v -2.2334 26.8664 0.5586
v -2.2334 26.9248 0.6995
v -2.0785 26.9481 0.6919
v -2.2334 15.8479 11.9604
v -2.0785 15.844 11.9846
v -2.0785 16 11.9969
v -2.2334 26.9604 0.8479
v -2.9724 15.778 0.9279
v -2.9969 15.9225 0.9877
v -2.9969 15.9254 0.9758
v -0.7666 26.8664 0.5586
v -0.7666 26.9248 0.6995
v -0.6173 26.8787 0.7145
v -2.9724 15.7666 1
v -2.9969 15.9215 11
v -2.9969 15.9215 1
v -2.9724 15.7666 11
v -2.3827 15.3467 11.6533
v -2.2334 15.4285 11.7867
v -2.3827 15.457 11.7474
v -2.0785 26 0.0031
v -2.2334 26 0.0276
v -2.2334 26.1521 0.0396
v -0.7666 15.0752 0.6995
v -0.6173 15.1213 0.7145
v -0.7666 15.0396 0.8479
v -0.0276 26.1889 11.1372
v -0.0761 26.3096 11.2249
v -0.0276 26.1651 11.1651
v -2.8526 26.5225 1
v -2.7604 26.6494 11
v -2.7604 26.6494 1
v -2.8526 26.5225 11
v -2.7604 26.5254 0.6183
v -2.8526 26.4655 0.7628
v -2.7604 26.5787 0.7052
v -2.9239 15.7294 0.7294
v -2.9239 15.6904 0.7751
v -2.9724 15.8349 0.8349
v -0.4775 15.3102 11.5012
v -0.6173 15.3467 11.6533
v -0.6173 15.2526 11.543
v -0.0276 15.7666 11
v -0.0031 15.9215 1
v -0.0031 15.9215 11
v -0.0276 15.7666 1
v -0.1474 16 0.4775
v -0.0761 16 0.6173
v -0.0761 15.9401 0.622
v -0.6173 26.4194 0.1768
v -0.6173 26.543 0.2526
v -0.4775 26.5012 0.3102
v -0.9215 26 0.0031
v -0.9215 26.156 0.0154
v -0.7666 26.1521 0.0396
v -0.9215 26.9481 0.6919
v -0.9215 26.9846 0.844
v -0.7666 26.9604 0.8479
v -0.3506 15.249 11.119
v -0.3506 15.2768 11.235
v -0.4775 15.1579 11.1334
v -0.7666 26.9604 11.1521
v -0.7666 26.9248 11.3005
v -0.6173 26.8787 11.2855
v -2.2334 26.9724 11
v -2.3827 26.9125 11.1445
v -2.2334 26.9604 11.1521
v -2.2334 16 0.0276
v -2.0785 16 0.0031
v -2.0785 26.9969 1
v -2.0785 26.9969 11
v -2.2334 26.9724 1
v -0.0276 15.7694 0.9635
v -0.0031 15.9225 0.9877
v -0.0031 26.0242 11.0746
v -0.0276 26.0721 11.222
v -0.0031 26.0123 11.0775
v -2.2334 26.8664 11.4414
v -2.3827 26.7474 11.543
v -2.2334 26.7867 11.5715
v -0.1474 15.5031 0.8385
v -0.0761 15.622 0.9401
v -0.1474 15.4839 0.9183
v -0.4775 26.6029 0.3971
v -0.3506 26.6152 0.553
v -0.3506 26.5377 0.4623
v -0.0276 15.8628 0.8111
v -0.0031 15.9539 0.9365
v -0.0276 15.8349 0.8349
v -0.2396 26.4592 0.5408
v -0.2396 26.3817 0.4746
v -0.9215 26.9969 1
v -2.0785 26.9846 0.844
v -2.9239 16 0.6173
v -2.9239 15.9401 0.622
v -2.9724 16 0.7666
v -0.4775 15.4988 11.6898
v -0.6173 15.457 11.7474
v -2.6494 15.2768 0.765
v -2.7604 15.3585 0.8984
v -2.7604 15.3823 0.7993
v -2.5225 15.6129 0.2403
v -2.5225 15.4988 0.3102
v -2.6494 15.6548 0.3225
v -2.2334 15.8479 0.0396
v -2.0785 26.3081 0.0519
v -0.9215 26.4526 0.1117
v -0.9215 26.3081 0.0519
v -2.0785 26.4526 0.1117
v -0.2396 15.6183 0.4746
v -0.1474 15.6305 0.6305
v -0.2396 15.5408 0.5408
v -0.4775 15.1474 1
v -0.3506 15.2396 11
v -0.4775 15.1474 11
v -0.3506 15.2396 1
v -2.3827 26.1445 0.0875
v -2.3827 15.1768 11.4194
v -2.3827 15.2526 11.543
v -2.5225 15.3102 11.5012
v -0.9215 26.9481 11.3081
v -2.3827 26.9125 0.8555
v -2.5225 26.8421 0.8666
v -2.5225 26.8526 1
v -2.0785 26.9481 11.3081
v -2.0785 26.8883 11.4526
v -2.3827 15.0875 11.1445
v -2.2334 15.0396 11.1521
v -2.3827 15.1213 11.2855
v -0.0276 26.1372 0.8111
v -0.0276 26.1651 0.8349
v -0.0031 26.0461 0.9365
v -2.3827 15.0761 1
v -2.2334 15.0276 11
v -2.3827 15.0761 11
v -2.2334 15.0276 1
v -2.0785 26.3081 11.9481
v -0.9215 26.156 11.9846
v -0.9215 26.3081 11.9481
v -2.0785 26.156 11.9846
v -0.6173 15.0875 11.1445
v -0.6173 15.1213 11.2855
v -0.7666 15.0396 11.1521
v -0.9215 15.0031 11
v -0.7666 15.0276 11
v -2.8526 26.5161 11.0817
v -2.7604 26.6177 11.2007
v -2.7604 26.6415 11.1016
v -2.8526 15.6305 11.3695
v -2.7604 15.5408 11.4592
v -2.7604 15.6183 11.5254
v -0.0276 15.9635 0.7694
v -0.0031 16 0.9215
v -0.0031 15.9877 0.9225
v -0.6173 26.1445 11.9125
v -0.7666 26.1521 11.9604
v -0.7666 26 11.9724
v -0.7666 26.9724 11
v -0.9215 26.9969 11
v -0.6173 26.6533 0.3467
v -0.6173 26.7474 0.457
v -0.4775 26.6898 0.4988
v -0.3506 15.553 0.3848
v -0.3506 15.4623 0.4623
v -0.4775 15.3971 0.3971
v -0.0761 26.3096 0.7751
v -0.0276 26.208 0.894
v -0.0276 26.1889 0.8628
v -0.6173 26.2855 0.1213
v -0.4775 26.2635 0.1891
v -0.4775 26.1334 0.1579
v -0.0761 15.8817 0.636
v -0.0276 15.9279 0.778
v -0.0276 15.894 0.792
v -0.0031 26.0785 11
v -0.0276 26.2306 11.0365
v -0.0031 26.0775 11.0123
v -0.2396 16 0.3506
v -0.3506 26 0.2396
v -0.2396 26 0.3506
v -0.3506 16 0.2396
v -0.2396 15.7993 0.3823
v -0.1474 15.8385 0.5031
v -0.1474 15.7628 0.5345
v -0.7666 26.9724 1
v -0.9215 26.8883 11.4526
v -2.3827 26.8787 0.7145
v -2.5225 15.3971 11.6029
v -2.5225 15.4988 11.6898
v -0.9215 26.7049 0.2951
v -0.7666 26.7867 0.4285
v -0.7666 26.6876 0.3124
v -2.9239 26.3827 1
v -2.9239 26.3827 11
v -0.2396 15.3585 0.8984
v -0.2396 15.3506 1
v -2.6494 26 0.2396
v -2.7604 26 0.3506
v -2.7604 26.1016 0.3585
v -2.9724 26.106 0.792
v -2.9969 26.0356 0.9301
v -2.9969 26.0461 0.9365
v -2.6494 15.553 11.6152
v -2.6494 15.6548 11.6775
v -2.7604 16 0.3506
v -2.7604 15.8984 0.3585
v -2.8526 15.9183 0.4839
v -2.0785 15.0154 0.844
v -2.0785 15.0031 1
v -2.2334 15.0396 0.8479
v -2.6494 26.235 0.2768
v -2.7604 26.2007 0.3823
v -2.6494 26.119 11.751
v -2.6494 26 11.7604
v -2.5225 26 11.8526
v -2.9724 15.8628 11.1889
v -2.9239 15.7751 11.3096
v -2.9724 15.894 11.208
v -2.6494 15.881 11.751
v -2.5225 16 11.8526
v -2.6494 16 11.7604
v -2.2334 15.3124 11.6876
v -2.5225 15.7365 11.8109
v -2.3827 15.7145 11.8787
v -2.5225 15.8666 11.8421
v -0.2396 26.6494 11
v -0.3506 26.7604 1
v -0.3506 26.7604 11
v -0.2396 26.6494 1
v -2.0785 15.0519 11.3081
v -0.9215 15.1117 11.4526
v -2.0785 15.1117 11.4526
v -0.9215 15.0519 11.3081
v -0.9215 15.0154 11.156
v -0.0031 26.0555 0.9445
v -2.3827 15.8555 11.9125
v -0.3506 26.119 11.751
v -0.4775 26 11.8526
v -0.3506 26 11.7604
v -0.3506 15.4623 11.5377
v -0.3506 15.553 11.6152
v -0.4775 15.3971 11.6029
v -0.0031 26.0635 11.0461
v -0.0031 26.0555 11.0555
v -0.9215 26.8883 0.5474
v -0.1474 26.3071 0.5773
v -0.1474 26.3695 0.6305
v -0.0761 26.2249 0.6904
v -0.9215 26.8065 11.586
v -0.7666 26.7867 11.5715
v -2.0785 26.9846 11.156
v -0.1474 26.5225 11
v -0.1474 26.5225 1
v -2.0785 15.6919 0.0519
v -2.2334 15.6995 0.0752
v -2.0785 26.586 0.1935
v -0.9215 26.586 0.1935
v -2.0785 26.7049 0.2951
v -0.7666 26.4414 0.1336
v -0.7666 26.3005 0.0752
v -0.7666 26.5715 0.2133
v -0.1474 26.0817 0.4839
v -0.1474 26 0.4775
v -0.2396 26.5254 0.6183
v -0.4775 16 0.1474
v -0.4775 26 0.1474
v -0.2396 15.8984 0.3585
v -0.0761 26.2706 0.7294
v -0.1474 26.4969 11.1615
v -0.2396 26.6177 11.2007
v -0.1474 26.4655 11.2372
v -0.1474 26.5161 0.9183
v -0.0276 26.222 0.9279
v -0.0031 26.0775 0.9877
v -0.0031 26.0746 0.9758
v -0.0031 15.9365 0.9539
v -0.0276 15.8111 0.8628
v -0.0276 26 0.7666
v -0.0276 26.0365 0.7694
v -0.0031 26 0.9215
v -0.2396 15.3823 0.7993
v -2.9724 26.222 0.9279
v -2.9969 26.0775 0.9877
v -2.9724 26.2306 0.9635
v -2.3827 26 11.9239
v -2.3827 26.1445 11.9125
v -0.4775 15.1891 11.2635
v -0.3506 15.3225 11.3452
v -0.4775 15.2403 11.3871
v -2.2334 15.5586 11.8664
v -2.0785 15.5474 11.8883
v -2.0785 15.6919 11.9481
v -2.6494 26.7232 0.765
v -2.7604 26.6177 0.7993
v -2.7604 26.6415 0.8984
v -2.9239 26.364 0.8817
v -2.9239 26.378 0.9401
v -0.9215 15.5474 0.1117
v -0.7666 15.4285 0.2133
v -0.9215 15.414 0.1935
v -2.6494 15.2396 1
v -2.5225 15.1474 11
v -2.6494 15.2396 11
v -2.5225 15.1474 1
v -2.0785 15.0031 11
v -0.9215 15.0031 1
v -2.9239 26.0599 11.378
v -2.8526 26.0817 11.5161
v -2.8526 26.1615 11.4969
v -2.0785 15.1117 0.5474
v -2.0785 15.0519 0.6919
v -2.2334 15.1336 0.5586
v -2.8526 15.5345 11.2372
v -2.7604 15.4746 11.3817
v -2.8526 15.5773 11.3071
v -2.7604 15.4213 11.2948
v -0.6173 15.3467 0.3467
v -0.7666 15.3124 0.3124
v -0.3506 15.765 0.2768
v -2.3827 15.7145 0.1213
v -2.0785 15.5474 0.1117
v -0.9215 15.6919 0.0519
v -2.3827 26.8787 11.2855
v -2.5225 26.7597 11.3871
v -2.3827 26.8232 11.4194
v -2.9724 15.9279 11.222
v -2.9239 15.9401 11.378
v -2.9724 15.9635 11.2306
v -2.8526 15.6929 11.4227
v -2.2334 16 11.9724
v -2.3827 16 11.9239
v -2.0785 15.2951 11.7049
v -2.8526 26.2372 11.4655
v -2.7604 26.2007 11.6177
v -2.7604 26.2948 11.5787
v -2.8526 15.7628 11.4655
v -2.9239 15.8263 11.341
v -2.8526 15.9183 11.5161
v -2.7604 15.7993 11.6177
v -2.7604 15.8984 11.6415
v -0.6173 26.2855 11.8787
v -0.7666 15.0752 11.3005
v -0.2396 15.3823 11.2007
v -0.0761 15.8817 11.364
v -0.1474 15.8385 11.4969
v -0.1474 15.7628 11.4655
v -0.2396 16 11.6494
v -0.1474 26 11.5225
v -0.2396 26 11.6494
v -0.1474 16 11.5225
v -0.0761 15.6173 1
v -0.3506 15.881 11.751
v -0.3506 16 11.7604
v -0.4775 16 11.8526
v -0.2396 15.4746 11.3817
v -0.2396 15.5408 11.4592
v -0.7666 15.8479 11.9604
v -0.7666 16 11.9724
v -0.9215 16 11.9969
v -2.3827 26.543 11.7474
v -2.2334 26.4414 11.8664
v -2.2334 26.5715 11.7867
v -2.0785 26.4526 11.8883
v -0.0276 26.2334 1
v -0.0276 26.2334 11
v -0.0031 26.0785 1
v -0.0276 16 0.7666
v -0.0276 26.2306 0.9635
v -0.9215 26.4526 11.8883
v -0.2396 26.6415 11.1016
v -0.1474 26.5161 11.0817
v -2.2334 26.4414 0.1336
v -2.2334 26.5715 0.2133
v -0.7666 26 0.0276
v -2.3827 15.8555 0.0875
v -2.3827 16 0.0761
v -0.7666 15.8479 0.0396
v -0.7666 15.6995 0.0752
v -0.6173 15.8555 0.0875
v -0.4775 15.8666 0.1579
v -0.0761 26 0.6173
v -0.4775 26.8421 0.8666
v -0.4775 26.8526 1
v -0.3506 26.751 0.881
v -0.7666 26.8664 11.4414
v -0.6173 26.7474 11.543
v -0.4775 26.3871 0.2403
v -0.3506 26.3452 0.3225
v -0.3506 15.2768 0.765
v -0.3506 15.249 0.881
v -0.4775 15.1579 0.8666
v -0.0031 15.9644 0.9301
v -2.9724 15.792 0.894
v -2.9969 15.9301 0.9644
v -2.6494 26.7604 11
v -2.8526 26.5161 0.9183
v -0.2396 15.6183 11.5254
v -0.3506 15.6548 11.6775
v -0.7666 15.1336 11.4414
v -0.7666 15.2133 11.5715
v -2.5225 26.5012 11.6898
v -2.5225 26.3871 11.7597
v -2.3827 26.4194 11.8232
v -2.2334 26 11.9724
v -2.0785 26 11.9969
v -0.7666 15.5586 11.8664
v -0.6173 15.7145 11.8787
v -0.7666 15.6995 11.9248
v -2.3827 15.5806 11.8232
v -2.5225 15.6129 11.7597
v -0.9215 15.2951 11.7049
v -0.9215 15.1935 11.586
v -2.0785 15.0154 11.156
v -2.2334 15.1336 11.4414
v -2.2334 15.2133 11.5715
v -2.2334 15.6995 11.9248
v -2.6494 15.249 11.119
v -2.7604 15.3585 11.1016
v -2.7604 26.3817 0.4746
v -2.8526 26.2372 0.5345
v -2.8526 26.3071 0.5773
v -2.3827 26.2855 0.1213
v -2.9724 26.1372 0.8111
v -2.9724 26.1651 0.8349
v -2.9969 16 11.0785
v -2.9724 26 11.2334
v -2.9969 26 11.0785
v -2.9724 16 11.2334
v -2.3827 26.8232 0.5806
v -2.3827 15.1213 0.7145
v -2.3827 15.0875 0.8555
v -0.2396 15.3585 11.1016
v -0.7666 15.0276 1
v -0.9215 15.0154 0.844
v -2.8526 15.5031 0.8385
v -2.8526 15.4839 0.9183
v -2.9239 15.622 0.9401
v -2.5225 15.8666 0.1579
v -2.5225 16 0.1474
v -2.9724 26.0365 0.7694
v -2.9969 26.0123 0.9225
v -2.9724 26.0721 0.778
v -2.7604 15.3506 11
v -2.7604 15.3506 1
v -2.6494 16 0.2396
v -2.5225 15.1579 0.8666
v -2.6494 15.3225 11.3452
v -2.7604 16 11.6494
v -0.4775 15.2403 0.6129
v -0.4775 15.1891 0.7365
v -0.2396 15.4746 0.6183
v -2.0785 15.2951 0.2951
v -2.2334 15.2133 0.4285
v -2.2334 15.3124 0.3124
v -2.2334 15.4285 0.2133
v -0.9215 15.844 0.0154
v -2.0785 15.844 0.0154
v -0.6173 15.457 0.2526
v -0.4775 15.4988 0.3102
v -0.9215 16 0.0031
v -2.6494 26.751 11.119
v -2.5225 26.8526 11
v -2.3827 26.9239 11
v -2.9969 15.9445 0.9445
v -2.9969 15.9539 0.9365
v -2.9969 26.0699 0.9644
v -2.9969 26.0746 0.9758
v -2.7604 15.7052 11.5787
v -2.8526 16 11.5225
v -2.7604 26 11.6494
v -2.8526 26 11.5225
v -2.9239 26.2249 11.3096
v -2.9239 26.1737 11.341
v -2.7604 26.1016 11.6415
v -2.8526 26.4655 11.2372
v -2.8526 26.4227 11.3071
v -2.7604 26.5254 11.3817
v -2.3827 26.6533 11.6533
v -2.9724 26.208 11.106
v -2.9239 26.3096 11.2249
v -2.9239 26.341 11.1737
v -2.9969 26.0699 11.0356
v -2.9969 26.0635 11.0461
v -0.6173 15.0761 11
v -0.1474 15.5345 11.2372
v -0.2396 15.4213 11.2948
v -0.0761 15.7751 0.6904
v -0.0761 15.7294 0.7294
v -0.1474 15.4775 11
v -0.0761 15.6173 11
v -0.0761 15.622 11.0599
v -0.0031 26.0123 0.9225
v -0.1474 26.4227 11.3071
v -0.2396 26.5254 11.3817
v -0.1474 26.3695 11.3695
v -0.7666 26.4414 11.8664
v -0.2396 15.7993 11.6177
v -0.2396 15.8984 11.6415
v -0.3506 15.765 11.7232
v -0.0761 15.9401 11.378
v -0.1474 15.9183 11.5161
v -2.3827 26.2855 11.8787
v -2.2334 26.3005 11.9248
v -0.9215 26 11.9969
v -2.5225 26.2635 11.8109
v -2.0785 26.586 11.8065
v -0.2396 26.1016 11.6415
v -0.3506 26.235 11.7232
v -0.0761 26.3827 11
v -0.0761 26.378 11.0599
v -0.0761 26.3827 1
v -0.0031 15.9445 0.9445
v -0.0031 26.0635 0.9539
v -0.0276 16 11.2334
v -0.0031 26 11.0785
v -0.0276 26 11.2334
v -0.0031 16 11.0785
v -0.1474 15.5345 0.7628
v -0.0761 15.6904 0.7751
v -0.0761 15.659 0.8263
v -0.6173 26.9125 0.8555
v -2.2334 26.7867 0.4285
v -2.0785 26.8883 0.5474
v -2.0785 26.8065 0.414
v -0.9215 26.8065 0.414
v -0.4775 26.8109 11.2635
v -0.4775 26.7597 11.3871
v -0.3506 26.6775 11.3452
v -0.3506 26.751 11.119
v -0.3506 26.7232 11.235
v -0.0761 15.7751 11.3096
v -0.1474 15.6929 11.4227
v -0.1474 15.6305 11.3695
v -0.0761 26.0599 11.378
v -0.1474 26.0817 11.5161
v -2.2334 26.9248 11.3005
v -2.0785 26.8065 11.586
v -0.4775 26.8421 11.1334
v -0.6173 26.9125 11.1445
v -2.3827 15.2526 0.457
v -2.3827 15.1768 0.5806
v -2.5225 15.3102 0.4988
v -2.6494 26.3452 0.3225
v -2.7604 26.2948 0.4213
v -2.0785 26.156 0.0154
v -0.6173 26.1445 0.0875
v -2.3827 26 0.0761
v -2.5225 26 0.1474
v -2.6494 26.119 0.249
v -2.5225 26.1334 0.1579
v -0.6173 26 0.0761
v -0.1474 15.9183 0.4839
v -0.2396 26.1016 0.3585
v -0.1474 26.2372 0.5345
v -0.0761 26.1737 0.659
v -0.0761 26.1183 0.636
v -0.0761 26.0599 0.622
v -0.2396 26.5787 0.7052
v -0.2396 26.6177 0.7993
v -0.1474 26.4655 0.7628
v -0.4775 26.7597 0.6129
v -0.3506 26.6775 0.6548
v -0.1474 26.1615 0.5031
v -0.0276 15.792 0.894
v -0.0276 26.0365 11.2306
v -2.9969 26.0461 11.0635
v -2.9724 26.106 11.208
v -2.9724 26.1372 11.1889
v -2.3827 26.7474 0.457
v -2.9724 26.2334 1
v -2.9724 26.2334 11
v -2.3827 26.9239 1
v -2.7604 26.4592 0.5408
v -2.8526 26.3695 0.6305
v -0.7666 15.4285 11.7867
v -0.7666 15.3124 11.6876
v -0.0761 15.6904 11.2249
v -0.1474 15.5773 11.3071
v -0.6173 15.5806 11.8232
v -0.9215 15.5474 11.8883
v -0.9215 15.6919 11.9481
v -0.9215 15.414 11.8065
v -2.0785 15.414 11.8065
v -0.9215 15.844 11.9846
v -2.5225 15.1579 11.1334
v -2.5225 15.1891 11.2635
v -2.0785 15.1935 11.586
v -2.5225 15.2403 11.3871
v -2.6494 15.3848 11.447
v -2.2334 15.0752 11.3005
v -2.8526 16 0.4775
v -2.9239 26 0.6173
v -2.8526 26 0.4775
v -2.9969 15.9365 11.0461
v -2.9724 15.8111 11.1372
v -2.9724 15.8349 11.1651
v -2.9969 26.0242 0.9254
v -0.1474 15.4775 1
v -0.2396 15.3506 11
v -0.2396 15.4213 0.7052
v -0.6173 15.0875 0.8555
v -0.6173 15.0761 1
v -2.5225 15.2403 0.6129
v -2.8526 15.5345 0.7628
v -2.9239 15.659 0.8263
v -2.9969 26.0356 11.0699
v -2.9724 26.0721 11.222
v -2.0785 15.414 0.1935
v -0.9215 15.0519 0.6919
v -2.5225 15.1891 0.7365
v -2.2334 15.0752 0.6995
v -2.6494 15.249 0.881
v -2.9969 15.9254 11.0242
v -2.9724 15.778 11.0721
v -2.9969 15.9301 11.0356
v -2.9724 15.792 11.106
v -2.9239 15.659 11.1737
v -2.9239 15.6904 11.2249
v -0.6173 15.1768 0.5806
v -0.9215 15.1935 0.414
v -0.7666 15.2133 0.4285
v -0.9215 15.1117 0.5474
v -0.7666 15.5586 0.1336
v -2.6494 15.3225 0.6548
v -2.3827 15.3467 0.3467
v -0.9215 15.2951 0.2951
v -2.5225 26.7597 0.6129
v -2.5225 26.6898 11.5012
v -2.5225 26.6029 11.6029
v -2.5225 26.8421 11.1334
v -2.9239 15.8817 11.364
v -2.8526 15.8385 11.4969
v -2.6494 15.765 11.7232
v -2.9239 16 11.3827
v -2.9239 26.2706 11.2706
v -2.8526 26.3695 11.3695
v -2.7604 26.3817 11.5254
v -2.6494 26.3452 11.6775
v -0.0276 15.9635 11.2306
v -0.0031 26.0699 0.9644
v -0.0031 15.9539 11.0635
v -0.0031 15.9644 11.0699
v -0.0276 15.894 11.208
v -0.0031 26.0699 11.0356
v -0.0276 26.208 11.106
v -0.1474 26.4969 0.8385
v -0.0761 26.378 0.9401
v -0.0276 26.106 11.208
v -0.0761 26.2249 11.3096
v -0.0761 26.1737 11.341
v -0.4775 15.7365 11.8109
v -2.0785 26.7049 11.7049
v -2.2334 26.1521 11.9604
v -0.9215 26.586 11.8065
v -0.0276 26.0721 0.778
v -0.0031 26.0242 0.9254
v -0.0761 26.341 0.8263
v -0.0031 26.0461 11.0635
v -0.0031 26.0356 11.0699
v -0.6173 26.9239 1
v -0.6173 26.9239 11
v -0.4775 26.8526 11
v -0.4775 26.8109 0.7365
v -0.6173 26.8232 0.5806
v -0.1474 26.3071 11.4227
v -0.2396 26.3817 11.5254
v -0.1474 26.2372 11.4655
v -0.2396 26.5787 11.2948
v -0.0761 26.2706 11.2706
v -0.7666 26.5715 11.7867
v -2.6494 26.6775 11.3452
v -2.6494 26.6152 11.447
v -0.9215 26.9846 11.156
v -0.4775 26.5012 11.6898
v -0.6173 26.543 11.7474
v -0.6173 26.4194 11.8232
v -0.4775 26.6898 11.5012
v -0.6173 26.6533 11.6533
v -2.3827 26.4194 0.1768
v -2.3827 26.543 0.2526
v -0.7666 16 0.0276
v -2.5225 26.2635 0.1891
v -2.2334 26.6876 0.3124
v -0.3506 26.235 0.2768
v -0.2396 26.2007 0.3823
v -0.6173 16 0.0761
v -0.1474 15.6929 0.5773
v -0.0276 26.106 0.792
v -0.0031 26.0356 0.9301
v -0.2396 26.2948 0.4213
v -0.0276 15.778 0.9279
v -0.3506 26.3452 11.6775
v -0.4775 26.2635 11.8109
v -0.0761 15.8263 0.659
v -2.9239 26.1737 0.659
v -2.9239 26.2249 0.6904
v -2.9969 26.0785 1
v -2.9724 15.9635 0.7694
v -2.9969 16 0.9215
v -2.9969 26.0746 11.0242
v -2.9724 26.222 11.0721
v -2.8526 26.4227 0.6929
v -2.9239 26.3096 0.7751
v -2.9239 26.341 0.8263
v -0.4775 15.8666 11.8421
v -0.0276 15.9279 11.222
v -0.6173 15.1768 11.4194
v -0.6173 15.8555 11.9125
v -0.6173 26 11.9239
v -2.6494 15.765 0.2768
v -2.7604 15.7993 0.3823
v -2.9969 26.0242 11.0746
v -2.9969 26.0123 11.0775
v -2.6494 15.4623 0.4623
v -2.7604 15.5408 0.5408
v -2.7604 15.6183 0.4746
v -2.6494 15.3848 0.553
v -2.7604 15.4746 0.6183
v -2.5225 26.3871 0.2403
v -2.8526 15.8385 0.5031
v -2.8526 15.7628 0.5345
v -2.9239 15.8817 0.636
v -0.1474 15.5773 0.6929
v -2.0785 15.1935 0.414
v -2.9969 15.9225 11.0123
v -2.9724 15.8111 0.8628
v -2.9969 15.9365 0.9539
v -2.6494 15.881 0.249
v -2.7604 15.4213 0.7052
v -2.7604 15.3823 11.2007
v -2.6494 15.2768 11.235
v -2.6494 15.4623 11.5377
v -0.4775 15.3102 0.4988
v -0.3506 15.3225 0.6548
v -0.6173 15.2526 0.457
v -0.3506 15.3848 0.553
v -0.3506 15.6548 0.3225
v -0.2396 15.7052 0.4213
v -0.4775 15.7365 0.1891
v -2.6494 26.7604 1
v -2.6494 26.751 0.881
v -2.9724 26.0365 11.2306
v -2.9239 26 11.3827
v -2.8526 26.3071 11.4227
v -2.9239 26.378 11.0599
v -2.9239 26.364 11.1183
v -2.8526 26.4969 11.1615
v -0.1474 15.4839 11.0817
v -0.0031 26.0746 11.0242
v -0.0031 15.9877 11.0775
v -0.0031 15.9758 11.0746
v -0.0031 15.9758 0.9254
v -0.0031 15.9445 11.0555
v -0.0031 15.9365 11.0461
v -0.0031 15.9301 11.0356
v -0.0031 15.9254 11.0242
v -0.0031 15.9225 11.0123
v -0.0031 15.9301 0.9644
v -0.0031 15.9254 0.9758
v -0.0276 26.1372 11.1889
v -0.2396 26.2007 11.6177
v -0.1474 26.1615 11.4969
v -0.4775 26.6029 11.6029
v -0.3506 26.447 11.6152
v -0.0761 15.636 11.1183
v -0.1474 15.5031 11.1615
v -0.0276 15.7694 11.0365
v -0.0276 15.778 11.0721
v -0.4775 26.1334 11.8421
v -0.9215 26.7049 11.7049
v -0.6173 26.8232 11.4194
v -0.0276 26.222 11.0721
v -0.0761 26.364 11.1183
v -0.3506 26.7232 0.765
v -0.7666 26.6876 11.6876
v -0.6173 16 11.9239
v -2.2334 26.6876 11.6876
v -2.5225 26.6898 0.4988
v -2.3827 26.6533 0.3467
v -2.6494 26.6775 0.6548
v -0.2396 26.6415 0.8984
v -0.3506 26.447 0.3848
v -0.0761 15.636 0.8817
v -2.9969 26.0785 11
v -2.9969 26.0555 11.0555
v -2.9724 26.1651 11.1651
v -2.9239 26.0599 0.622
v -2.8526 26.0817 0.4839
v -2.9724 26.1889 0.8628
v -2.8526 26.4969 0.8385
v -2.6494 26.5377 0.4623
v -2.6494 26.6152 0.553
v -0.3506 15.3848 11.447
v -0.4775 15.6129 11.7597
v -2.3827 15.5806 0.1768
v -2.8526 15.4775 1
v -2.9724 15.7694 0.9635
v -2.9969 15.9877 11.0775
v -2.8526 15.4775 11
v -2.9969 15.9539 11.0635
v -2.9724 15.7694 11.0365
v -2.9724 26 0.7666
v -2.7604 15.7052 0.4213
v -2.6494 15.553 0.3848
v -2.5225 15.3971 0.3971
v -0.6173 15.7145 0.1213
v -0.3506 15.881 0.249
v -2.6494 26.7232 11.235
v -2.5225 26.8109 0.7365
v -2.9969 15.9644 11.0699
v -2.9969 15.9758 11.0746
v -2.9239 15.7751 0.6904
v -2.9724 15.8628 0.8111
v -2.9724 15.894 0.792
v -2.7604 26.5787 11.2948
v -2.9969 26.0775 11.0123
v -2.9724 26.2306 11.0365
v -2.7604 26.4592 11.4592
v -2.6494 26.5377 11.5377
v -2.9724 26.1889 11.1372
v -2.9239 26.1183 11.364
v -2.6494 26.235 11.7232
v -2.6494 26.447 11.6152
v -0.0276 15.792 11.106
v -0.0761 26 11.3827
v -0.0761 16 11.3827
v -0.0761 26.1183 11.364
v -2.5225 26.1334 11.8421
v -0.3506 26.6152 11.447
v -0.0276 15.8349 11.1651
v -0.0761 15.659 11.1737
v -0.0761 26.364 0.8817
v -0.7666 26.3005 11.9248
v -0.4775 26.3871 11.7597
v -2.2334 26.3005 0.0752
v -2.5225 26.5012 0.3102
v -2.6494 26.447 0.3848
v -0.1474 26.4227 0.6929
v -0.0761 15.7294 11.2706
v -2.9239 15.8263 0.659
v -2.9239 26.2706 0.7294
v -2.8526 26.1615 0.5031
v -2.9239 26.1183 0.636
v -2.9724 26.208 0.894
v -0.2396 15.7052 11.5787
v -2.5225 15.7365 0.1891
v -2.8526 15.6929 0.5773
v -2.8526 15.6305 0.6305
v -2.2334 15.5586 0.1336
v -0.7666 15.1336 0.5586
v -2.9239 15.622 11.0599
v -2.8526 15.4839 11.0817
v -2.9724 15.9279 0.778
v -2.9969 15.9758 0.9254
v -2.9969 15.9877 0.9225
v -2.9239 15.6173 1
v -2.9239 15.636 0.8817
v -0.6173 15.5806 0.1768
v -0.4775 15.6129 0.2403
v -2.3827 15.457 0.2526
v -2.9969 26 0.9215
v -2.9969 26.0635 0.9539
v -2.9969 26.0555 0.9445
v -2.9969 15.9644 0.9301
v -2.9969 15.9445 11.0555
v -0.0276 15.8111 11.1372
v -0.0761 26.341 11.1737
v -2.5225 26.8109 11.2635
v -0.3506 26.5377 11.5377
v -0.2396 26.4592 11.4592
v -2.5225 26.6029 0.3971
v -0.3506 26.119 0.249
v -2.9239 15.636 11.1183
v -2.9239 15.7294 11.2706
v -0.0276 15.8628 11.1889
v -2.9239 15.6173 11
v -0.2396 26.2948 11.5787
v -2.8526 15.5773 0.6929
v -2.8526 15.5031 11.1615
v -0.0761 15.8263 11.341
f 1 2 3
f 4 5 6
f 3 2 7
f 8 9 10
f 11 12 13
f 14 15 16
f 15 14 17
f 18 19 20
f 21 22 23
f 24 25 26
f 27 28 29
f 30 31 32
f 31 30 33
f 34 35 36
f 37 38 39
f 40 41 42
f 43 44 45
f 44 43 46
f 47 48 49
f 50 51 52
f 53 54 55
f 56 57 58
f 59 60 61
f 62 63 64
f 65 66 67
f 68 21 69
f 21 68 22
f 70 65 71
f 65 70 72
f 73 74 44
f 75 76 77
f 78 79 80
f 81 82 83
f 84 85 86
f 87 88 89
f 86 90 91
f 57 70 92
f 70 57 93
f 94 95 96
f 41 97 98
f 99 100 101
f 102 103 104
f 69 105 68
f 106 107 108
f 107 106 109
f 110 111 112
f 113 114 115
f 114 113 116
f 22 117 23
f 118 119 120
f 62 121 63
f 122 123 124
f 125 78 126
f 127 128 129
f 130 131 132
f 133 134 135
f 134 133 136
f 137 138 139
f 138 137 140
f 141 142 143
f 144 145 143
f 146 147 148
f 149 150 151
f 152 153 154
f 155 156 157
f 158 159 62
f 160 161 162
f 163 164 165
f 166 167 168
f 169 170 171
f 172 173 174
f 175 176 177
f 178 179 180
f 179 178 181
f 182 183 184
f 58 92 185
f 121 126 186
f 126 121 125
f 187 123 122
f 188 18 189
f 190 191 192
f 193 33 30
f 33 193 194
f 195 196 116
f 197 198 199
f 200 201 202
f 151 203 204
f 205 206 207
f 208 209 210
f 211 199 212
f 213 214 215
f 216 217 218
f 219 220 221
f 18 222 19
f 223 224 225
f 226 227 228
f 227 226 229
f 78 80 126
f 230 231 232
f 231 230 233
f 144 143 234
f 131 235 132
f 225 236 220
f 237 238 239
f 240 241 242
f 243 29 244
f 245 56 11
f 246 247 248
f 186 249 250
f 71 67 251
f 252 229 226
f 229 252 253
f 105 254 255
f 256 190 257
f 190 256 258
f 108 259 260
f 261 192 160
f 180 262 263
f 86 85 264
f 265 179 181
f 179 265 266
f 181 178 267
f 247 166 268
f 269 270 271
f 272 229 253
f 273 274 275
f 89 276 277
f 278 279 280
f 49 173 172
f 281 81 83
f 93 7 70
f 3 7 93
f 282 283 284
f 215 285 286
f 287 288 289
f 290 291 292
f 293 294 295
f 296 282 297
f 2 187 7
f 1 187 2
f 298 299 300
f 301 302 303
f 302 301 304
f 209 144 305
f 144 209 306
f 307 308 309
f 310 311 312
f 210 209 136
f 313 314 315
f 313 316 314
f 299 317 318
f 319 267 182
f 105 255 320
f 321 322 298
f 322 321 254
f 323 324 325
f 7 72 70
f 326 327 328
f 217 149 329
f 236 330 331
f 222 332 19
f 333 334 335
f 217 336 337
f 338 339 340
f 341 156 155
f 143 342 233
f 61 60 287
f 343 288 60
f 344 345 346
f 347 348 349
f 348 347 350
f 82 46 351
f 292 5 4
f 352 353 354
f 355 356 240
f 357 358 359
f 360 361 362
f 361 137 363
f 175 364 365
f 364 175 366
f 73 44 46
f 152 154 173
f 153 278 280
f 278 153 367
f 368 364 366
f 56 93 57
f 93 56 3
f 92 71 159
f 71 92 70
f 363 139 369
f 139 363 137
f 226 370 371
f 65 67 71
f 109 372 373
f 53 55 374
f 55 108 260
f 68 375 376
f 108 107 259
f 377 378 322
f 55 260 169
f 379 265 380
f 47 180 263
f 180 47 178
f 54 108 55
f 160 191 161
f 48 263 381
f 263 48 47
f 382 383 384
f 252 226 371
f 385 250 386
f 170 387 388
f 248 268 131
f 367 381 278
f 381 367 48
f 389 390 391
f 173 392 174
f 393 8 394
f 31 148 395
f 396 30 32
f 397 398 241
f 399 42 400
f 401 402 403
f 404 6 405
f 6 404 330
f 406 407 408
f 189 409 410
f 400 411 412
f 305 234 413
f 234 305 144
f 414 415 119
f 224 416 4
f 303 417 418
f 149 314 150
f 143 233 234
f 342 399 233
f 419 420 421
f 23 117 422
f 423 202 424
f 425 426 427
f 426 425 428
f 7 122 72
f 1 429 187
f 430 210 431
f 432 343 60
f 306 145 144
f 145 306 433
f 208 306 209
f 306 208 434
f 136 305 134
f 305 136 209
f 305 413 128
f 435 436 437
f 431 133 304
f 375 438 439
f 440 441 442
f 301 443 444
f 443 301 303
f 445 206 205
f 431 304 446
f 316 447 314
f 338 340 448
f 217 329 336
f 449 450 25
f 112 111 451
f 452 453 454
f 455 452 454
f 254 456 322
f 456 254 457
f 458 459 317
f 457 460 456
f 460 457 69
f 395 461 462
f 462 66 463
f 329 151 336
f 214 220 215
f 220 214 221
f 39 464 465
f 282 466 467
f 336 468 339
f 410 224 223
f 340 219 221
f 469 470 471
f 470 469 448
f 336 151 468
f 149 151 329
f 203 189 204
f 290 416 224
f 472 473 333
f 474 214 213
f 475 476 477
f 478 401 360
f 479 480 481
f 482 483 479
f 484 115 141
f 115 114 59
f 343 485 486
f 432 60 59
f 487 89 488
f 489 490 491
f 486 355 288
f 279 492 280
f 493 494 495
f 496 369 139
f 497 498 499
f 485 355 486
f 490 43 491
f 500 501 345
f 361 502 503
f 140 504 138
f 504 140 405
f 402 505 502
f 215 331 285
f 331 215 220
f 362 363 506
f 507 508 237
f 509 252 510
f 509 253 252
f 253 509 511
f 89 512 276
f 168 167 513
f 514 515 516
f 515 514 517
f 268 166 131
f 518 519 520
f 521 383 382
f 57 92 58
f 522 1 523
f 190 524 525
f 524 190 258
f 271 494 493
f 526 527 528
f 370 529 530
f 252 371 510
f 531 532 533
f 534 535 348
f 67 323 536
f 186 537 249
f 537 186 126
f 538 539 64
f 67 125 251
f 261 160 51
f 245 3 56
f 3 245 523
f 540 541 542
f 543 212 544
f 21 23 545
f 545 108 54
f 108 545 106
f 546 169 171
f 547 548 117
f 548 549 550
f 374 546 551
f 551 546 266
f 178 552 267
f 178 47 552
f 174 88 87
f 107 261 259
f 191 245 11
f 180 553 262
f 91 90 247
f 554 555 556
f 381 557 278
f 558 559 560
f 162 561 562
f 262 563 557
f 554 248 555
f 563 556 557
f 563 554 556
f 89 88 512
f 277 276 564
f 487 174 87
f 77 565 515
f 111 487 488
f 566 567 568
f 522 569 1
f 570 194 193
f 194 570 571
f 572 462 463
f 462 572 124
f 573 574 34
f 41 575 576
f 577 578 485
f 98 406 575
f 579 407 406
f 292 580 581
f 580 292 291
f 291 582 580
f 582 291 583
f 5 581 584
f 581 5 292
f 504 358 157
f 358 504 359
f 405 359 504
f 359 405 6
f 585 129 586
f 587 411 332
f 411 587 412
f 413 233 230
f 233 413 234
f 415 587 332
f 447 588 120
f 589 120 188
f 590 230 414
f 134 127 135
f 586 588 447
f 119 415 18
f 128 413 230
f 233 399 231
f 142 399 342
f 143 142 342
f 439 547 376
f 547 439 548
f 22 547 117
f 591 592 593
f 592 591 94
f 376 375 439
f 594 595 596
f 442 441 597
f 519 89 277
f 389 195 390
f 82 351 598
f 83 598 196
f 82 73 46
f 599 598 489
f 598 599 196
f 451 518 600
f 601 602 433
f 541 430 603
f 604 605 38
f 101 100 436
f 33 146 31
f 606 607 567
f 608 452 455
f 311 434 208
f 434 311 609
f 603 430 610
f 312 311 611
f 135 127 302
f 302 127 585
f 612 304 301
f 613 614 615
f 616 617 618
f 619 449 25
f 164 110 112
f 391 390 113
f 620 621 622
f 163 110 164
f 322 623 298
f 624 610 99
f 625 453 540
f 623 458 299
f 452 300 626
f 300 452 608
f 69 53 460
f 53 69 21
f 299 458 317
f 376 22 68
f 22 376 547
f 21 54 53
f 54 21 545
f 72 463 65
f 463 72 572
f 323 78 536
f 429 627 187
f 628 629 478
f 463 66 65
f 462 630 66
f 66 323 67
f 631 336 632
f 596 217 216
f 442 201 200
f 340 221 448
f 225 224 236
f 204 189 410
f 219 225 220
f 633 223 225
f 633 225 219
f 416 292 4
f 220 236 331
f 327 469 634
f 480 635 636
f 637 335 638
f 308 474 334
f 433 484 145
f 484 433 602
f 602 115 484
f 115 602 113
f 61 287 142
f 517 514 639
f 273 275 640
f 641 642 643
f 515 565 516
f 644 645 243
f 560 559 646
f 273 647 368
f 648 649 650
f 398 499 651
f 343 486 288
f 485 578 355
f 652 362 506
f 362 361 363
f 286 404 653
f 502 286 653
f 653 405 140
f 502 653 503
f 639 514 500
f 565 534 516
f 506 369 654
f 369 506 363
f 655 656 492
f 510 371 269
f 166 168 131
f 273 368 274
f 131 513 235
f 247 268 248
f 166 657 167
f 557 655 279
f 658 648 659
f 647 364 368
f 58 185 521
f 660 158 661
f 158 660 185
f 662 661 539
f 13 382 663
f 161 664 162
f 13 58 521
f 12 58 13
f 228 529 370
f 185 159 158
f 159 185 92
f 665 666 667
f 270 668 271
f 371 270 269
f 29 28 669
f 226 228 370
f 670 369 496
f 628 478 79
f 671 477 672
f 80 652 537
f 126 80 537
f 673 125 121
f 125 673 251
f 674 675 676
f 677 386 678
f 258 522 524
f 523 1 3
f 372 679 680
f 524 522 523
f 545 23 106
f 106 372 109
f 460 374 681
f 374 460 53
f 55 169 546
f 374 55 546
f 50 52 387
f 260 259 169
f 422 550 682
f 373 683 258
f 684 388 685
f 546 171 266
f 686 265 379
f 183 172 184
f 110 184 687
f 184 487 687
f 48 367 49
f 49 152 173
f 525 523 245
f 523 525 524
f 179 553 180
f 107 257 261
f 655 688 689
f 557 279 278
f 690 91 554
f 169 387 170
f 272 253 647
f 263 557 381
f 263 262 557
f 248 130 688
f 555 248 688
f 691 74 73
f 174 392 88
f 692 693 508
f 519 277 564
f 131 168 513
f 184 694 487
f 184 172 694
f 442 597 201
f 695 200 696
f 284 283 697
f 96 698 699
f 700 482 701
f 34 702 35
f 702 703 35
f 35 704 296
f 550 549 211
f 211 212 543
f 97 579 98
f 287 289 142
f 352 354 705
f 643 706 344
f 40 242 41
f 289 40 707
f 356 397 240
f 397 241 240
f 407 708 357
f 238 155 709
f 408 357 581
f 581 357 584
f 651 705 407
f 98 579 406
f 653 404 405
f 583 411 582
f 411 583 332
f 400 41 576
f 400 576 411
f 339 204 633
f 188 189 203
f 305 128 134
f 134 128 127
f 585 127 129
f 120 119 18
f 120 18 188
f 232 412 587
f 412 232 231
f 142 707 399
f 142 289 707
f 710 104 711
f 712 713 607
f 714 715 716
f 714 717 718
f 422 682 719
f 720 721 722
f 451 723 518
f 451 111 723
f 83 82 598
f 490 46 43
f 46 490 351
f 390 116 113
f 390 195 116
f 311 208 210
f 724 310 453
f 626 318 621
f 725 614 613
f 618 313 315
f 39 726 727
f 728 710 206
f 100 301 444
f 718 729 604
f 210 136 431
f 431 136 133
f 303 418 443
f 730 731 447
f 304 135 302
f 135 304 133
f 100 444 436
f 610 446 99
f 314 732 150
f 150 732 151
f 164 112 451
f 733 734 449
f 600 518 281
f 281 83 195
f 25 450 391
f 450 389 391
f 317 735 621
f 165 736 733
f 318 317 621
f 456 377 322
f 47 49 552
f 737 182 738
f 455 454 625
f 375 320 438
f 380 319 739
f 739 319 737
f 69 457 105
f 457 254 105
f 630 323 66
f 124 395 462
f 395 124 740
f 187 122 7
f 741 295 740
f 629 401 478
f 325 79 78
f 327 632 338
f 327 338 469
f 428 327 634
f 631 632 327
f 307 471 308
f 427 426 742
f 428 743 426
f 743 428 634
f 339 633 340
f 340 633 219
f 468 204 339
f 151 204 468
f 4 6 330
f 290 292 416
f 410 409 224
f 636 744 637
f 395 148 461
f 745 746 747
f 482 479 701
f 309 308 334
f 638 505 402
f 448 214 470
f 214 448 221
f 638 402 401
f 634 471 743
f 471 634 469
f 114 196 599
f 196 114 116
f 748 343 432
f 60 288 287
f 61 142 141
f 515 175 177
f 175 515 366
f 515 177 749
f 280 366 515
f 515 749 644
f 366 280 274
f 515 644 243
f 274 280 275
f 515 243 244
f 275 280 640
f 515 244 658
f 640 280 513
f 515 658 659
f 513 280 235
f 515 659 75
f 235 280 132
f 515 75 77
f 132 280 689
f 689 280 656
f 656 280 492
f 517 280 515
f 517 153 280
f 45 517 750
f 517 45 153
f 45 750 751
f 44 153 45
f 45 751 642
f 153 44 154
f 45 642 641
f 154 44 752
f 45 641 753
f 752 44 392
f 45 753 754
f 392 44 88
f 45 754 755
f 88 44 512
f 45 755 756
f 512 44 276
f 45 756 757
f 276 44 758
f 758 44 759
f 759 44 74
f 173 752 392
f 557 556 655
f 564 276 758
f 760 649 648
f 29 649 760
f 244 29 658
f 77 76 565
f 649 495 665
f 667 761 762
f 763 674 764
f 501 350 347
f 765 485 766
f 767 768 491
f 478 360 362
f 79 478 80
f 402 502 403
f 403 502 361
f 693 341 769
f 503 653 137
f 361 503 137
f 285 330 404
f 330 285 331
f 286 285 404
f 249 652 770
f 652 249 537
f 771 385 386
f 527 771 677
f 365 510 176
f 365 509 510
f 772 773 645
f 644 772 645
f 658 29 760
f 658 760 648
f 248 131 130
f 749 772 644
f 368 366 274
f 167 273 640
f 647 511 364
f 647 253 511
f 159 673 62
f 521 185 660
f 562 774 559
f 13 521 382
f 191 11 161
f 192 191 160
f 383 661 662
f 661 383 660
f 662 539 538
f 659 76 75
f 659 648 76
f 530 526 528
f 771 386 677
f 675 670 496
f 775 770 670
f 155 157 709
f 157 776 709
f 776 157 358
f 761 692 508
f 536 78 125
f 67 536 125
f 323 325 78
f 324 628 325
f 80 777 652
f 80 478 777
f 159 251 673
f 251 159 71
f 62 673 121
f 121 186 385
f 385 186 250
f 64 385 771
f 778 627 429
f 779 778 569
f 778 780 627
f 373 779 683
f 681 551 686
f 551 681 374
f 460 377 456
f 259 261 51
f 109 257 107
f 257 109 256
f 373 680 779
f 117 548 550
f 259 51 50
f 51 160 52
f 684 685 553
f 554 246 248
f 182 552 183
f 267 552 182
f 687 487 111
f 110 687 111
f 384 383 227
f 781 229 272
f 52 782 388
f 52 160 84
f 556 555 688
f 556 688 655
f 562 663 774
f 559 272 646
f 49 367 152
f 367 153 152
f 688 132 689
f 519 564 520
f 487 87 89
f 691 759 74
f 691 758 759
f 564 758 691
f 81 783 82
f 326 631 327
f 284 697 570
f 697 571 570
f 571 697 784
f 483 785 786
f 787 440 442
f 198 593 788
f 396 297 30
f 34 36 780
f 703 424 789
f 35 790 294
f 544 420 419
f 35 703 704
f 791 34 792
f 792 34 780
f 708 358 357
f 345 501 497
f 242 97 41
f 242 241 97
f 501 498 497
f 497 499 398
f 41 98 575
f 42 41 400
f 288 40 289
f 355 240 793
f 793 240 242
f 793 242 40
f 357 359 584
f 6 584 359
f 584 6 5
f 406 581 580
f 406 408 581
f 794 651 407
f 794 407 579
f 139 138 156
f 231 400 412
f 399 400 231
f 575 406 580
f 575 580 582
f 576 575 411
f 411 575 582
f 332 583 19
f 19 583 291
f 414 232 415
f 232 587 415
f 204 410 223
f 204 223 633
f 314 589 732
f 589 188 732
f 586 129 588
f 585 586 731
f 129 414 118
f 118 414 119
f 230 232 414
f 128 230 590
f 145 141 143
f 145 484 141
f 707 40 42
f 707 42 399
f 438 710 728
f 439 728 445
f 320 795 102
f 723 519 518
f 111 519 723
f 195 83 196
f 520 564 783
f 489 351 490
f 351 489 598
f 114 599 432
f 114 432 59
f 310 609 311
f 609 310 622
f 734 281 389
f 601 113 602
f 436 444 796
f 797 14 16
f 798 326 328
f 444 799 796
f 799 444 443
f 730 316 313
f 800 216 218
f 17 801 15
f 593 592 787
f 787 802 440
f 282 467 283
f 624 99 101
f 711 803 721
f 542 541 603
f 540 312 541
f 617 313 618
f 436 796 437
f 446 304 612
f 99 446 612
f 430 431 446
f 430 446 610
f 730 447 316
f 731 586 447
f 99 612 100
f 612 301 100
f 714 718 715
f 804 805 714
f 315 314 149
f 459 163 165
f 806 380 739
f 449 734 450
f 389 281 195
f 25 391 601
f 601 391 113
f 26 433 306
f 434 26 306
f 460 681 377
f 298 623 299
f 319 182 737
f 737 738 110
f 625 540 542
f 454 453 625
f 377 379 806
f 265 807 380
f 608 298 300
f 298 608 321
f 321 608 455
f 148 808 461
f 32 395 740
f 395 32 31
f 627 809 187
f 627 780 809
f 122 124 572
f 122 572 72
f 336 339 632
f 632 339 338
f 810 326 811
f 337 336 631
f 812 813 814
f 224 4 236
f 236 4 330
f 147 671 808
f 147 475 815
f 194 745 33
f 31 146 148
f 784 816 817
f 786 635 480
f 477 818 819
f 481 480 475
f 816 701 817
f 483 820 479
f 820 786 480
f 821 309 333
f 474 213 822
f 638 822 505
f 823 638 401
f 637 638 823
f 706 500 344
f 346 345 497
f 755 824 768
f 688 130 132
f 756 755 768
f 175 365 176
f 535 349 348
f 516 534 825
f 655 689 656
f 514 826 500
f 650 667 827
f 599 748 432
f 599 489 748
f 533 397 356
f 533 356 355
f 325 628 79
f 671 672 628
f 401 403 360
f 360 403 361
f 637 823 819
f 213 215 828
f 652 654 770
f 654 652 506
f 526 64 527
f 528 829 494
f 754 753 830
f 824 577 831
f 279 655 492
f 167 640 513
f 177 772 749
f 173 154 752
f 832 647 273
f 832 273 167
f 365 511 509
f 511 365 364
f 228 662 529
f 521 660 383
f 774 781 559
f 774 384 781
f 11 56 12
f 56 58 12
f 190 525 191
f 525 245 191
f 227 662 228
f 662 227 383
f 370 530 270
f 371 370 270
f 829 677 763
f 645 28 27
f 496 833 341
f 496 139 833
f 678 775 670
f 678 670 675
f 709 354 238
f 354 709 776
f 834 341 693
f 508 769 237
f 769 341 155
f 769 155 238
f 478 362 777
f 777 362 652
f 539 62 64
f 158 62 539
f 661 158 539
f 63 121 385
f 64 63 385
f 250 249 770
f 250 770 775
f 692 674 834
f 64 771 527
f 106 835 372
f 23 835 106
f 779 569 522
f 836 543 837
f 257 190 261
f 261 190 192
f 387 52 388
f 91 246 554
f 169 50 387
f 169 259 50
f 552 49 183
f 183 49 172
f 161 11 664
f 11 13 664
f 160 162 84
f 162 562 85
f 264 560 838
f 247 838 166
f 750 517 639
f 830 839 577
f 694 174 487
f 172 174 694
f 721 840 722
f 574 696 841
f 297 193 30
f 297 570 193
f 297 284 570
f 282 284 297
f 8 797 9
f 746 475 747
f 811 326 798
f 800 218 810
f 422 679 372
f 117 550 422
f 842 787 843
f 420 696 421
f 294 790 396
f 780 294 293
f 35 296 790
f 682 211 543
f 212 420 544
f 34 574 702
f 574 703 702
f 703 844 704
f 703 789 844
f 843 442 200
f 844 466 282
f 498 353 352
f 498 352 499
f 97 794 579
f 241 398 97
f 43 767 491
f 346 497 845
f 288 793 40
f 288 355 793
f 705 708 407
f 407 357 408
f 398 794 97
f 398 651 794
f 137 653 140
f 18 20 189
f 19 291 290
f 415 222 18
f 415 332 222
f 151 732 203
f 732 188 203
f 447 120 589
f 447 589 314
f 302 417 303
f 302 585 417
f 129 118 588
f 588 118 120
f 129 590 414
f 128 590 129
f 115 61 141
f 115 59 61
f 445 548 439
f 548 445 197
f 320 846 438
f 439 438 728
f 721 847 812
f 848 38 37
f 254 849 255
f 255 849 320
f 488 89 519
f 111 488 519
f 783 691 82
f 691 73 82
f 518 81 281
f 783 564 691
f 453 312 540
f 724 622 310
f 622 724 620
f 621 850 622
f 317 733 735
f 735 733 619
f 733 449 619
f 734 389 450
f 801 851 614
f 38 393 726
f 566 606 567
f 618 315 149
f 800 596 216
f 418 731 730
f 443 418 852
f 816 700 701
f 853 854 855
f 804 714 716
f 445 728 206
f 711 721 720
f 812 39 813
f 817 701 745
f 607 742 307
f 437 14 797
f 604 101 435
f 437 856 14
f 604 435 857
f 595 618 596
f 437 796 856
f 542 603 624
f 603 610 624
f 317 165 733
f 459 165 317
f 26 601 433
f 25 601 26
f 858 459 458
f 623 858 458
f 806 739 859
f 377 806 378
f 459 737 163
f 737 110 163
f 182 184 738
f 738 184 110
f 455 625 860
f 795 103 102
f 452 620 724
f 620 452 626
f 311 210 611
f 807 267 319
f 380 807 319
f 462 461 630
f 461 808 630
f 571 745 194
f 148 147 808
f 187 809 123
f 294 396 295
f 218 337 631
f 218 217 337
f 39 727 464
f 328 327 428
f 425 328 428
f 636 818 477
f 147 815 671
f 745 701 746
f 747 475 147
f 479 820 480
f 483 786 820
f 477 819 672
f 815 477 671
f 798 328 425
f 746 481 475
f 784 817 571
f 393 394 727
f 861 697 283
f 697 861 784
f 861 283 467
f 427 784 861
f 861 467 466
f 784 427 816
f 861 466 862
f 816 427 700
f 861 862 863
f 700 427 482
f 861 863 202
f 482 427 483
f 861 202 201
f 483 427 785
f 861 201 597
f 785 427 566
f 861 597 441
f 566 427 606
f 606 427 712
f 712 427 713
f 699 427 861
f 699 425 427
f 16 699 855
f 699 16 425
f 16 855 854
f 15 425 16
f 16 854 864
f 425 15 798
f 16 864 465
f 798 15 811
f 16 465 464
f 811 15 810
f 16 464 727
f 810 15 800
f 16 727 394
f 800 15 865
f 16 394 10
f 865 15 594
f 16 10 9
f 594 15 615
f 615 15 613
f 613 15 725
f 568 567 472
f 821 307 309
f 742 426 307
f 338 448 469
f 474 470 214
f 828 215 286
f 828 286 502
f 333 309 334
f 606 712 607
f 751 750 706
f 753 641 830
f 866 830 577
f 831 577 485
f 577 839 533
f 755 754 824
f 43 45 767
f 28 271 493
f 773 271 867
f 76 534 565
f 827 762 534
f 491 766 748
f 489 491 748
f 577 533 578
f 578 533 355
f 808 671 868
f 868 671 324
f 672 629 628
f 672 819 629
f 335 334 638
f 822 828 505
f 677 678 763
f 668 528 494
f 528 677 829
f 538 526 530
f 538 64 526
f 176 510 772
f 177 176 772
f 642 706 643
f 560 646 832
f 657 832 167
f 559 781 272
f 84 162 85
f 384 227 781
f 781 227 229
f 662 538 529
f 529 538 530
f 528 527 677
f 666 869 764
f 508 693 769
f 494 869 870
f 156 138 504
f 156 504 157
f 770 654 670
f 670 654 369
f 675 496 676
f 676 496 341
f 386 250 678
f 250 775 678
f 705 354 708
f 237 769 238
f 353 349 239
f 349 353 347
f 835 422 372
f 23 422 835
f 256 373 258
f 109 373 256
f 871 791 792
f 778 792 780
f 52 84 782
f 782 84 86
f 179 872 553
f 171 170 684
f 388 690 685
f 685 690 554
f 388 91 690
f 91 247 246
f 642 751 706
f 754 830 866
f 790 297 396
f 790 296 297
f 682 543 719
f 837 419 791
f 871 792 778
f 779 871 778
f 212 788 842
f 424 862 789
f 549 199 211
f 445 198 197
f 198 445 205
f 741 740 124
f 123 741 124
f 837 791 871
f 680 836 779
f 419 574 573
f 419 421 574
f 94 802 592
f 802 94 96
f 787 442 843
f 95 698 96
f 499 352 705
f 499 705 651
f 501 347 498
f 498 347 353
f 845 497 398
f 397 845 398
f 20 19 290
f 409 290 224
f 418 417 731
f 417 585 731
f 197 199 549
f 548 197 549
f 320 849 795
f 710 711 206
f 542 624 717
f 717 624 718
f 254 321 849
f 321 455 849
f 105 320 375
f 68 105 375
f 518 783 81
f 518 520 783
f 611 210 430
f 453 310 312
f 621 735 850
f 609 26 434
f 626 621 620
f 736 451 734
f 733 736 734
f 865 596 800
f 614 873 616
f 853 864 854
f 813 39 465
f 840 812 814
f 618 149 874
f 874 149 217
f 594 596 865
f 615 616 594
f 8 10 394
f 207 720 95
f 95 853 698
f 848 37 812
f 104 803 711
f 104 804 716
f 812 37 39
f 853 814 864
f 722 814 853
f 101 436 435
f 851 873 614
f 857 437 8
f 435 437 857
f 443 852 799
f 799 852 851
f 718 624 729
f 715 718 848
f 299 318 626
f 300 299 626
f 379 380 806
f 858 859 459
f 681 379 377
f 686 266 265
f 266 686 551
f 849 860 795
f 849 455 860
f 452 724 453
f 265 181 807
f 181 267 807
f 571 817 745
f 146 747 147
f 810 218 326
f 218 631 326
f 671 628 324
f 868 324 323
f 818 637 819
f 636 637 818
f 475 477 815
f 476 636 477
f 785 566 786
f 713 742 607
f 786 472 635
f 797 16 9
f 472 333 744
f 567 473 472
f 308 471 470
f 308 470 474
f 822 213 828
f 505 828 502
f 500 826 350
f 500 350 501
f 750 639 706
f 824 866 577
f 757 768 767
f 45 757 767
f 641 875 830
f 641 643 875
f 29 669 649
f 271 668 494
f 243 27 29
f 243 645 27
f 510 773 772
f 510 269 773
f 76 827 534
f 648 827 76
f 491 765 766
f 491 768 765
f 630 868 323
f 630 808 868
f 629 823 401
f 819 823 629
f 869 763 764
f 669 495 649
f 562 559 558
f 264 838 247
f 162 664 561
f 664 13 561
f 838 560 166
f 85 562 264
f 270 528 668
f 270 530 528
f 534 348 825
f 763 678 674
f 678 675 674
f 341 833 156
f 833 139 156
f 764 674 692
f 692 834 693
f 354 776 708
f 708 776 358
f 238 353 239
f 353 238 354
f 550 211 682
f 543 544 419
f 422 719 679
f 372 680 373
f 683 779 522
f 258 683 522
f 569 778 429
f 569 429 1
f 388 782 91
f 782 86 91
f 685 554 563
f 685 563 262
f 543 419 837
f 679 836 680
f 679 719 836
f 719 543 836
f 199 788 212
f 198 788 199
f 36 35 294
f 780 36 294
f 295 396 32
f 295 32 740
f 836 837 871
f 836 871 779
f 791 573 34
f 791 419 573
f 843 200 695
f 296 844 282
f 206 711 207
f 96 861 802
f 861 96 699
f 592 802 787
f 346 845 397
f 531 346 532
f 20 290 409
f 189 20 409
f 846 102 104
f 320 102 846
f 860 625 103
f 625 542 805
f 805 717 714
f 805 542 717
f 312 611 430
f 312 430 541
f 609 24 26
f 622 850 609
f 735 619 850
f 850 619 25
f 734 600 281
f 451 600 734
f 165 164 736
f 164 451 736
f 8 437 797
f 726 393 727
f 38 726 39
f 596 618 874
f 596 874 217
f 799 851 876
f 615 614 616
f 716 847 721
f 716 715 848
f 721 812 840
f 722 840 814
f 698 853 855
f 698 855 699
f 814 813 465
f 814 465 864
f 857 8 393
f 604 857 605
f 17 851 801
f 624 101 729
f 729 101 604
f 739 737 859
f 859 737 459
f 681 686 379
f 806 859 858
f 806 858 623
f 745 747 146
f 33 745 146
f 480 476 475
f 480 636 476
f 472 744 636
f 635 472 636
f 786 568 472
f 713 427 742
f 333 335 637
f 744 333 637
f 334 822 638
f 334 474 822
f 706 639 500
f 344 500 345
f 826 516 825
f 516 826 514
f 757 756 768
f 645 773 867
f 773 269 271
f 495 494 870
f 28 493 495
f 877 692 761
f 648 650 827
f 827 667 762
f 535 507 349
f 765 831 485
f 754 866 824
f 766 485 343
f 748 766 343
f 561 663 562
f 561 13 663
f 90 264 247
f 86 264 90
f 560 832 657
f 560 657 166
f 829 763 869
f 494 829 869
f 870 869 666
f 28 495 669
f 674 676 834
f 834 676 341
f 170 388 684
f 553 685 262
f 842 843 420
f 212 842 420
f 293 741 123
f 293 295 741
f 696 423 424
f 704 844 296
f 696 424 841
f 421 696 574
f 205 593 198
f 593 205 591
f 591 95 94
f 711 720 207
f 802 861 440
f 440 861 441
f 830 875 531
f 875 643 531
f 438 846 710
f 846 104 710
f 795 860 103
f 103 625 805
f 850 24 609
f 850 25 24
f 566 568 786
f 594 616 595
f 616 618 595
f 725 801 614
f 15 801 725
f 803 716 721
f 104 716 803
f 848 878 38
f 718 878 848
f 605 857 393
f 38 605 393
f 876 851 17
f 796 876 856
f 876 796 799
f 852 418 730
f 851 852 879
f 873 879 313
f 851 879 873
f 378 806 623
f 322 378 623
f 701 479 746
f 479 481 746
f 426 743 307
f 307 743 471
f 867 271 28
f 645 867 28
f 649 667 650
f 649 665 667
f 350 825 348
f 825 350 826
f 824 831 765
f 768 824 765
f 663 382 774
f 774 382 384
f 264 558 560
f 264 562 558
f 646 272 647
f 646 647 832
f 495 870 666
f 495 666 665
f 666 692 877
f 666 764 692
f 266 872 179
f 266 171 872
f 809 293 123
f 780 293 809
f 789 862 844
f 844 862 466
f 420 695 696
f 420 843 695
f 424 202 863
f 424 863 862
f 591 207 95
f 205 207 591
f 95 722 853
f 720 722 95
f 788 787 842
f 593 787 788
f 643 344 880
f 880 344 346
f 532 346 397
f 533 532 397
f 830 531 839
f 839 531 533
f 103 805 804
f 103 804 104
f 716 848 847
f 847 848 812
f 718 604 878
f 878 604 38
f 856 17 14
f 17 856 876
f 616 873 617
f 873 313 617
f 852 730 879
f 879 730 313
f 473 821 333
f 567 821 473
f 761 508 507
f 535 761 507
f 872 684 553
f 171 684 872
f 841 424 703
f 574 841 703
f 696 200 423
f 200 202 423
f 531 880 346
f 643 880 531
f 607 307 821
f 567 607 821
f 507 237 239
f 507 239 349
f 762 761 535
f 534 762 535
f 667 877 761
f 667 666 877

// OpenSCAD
$fn = 40;

//for (i=[0:9]){
//    translate ([i*15,0,0]) GoldTile();
//    translate ([i*15,15,0]) GoldTile();
//}


// Food light green
//translate ([0,15,0]) rotate([0,-90,0]) SheepTile();
//translate ([0,30,0]) rotate([0,-90,0]) WheatTile();
//translate ([0,45,0]) rotate([0,-90,0]) OliveTile();

// Yellow green
translate ([0,15,0]) rotate([0,-90,0]) WineTile();


// Food light blue/purple
//translate ([0,75,0]) rotate([0,-90,0]) FishTile();

// Luxery blue
//translate ([0,90,0]) rotate([0,-90,0]) PearlTile();
//translate ([0,105,0]) rotate([0,-90,0]) DyeTile();

// wood 
//translate ([0,120,0]) rotate([0,-90,0]) TreeTile();

// orange
//translate ([0,135,0]) rotate([0,-90,0]) OreTile();
//translate ([0,150,0]) rotate([0,-90,0]) GoldTile();

module DyeTile (){
  difference() 
  {
    translate([1,1,1]) minkowski(){sphere(1); cube ([10,10,1]);    }
    translate([1,2.4,2.2]) scale ([0.13,0.13,1]) linear_extrude (0.8) 
       import (file = "Squid.dxf");
  }
}

module GoldTile (){
  difference() 
  {
    translate([1,1,1]) minkowski(){sphere(1); cube ([10,10,1]);    }
    translate([3.2,2.6,2.2]) scale ([0.06,0.06,1]) linear_extrude (0.8) 
       import (file = "nugget.dxf");
    translate([3.5,6.2,2.2]) rotate ([0,0,45]) cube([0.8,1.5,0.8]);
    translate([5.2,7.2,2.2]) rotate ([0,0,5]) cube([0.8,1.5,0.8]);
    translate([7.2,7.2,2.2]) rotate ([0,0,-20]) cube([0.8,1,0.8]);
  }
}

module OliveTile (){
  difference() 
  {
    translate([1,1,1]) minkowski(){sphere(1); cube ([10,10,1]);    }
    translate([1.7,2.7,2.2]) scale ([0.18,0.19,1]) linear_extrude (0.8) 
       import (file = "Olive.dxf");
  }
}

module FishTile (){
  difference() 
  {
    translate([1,1,1]) minkowski(){sphere(1); cube ([10,10,1]);    }
    translate([2.0,4.2,2.2]) scale ([0.015,0.017,1]) linear_extrude (0.8) 
       import (file = "fish.dxf");
  }
}

module TreeTile (){
  difference() 
  {
    translate([1,1,1]) minkowski(){sphere(1); cube ([10,10,1]);}
    translate([2.0,2.2,2.2]) scale ([0.017,0.017,1]) linear_extrude (0.8) 
       import (file = "tree.dxf");
  }
}

module SheepTile (){
  difference() 
  {
    translate([1,1,1]) minkowski(){sphere(1); cube ([10,10,1]);}
    translate([1.4,2.2,2.2]) scale ([0.018,0.018,1]) linear_extrude (0.8) 
       import (file = "sheep.dxf");
  }
}


module WheatTile (){
  difference() 
  {
    translate([1,1,1]) minkowski(){sphere(1); cube ([10,10,1]);}
    translate([2.8,2.2,2.2]) scale ([0.04,0.04,1]) linear_extrude (0.8) 
       import (file = "wheat.dxf");
  }
}

module OreTile (){
  difference() 
  {
    translate([1,1,1]) minkowski(){sphere(1); cube ([10,10,1]);}
    translate([2.2,4.2,2.2]) cube([3.2,1.5,0.8]);
    translate([6.2,4.2,2.2]) cube([3.2,1.5,0.8]);
    translate([4.2,6.5,2.2]) cube([3.2,1.5,0.8]);
  }
}

module PearlTile (){
  difference() 
  {
    translate([1,1,1]) minkowski(){sphere(1); cube ([10,10,1]);}
    difference() {
      translate([5.7,5.7,2.2]) cylinder(h=0.8, r1=3, r2=3);
      translate([4.7,4.7,2.2]) cylinder(h=0.8, r1=1, r2=1);
    }

  }
}

module WineTile (){
  difference() 
  {
    translate([1,1,1]) minkowski(){sphere(1); cube ([10,10,1]);}
    translate([1.7,2.6,2.2]) scale ([0.017,0.017,1]) linear_extrude (0.8) 
       import (file = "Barrel.dxf");
  }
}
